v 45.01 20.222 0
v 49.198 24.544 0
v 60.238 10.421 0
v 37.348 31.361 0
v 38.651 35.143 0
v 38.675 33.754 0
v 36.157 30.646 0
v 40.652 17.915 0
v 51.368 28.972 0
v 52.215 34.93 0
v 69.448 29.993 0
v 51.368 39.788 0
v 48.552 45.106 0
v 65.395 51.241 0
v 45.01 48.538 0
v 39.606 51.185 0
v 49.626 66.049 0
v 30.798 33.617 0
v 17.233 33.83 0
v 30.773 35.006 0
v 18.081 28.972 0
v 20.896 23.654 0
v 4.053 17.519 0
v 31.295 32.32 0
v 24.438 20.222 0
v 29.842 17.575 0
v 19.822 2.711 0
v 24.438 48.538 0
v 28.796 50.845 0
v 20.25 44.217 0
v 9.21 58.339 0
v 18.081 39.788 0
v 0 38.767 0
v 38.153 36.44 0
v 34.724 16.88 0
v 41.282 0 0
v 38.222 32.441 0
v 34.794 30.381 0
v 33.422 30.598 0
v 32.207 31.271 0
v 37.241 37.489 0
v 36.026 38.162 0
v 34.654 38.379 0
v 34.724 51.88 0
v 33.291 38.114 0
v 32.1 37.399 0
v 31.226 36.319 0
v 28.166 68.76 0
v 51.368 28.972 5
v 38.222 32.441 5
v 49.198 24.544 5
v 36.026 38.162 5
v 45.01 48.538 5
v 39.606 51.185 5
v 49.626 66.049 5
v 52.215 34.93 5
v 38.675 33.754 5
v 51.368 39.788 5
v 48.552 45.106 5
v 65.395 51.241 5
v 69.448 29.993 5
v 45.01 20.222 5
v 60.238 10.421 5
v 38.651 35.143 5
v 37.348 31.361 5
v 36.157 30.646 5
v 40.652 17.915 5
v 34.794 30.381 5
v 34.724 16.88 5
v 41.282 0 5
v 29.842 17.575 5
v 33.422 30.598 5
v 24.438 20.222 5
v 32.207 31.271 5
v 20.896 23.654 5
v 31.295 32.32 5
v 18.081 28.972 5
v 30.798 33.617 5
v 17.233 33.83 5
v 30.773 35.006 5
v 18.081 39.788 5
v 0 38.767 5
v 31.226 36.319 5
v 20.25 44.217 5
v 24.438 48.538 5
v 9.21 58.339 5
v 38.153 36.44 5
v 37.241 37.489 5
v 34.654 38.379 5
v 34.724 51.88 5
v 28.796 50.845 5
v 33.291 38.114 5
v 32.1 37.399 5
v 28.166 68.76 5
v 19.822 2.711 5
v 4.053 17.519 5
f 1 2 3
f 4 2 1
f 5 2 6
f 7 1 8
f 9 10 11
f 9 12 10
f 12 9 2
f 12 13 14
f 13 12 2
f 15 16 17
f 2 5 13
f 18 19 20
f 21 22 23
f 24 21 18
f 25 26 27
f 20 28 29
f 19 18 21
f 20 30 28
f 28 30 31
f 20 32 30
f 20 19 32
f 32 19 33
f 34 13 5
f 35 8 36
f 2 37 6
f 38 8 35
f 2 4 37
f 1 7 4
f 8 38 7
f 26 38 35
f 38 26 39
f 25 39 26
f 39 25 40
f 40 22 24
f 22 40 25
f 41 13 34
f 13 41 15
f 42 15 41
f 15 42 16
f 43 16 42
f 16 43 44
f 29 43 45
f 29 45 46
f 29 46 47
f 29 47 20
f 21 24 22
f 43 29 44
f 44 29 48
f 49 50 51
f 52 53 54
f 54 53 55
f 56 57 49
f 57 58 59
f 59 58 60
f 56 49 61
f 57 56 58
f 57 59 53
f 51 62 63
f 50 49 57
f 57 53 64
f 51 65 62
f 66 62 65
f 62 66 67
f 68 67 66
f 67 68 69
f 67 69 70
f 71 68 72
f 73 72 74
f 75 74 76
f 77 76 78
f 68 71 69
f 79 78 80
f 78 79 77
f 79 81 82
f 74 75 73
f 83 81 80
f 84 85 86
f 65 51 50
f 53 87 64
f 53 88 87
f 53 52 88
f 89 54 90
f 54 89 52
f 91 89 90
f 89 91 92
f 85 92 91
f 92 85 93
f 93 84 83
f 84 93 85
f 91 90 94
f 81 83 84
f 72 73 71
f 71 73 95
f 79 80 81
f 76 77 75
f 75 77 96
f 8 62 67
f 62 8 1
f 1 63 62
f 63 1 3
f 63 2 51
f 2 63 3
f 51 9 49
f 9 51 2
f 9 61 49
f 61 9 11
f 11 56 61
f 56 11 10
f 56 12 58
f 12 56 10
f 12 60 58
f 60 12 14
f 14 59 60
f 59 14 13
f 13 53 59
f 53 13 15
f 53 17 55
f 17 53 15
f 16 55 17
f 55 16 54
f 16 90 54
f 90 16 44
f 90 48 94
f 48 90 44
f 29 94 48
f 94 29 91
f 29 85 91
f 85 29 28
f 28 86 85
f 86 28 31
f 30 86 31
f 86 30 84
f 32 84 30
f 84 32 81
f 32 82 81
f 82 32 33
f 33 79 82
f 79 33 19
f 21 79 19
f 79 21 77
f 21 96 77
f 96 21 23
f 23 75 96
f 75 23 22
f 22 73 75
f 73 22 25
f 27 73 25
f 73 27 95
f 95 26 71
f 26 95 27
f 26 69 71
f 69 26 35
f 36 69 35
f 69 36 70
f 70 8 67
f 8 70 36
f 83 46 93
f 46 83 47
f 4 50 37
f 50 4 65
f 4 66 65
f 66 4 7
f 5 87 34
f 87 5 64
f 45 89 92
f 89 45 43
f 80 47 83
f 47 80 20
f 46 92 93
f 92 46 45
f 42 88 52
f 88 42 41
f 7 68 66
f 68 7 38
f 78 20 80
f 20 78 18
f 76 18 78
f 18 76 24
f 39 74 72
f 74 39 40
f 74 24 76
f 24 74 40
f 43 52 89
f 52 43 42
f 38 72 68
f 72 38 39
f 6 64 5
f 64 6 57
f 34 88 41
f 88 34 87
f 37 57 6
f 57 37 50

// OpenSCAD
$fn = 32;

// ----------------------------------------------------------------------
// Star wheel: 10-point ratchet, R35
// ----------------------------------------------------------------------

// --- parameters (mm) ---
n_points = 10;            // number of points / teeth
r_out = 35;               // tip radius
r_in = 17.5;              // root radius
bore_r = 4;               // centre bore radius
plate_t = 5;              // plate thickness, Z (extrusion height)
bore_d = 8;               // centre bore diameter

profile = [[34.724, 51.88], [28.166, 68.76], [28.796, 50.845], [24.438, 48.538], [9.21, 58.339], [20.25, 44.217], [18.081, 39.788], [0, 38.767], [17.233, 33.83], [18.081, 28.972], [4.053, 17.519], [20.896, 23.654], [24.438, 20.222], [19.822, 2.711], [29.842, 17.575], [34.724, 16.88], [41.282, 0], [40.652, 17.915], [45.01, 20.222], [60.238, 10.421], [49.198, 24.544], [51.368, 28.972], [69.448, 29.993], [52.215, 34.93], [51.368, 39.788], [65.395, 51.241], [48.552, 45.106], [45.01, 48.538], [49.626, 66.049], [39.606, 51.185]];  // primary outline, 30 points, counter clockwise
void_1 = [[38.651, 35.143], [38.153, 36.44], [37.241, 37.489], [36.026, 38.162], [34.654, 38.379], [33.291, 38.114], [32.1, 37.399], [31.226, 36.319], [30.773, 35.006], [30.798, 33.617], [31.295, 32.32], [32.207, 31.271], [33.422, 30.598], [34.794, 30.381], [36.157, 30.646], [37.348, 31.361], [38.222, 32.441], [38.675, 33.754]];  // centre bore, 18 points

// --- the one profile operation ---
difference() {
  linear_extrude(height = plate_t) polygon(points = profile);
  translate([0, 0, -1])
    linear_extrude(height = plate_t + 2) polygon(points = void_1);
}
